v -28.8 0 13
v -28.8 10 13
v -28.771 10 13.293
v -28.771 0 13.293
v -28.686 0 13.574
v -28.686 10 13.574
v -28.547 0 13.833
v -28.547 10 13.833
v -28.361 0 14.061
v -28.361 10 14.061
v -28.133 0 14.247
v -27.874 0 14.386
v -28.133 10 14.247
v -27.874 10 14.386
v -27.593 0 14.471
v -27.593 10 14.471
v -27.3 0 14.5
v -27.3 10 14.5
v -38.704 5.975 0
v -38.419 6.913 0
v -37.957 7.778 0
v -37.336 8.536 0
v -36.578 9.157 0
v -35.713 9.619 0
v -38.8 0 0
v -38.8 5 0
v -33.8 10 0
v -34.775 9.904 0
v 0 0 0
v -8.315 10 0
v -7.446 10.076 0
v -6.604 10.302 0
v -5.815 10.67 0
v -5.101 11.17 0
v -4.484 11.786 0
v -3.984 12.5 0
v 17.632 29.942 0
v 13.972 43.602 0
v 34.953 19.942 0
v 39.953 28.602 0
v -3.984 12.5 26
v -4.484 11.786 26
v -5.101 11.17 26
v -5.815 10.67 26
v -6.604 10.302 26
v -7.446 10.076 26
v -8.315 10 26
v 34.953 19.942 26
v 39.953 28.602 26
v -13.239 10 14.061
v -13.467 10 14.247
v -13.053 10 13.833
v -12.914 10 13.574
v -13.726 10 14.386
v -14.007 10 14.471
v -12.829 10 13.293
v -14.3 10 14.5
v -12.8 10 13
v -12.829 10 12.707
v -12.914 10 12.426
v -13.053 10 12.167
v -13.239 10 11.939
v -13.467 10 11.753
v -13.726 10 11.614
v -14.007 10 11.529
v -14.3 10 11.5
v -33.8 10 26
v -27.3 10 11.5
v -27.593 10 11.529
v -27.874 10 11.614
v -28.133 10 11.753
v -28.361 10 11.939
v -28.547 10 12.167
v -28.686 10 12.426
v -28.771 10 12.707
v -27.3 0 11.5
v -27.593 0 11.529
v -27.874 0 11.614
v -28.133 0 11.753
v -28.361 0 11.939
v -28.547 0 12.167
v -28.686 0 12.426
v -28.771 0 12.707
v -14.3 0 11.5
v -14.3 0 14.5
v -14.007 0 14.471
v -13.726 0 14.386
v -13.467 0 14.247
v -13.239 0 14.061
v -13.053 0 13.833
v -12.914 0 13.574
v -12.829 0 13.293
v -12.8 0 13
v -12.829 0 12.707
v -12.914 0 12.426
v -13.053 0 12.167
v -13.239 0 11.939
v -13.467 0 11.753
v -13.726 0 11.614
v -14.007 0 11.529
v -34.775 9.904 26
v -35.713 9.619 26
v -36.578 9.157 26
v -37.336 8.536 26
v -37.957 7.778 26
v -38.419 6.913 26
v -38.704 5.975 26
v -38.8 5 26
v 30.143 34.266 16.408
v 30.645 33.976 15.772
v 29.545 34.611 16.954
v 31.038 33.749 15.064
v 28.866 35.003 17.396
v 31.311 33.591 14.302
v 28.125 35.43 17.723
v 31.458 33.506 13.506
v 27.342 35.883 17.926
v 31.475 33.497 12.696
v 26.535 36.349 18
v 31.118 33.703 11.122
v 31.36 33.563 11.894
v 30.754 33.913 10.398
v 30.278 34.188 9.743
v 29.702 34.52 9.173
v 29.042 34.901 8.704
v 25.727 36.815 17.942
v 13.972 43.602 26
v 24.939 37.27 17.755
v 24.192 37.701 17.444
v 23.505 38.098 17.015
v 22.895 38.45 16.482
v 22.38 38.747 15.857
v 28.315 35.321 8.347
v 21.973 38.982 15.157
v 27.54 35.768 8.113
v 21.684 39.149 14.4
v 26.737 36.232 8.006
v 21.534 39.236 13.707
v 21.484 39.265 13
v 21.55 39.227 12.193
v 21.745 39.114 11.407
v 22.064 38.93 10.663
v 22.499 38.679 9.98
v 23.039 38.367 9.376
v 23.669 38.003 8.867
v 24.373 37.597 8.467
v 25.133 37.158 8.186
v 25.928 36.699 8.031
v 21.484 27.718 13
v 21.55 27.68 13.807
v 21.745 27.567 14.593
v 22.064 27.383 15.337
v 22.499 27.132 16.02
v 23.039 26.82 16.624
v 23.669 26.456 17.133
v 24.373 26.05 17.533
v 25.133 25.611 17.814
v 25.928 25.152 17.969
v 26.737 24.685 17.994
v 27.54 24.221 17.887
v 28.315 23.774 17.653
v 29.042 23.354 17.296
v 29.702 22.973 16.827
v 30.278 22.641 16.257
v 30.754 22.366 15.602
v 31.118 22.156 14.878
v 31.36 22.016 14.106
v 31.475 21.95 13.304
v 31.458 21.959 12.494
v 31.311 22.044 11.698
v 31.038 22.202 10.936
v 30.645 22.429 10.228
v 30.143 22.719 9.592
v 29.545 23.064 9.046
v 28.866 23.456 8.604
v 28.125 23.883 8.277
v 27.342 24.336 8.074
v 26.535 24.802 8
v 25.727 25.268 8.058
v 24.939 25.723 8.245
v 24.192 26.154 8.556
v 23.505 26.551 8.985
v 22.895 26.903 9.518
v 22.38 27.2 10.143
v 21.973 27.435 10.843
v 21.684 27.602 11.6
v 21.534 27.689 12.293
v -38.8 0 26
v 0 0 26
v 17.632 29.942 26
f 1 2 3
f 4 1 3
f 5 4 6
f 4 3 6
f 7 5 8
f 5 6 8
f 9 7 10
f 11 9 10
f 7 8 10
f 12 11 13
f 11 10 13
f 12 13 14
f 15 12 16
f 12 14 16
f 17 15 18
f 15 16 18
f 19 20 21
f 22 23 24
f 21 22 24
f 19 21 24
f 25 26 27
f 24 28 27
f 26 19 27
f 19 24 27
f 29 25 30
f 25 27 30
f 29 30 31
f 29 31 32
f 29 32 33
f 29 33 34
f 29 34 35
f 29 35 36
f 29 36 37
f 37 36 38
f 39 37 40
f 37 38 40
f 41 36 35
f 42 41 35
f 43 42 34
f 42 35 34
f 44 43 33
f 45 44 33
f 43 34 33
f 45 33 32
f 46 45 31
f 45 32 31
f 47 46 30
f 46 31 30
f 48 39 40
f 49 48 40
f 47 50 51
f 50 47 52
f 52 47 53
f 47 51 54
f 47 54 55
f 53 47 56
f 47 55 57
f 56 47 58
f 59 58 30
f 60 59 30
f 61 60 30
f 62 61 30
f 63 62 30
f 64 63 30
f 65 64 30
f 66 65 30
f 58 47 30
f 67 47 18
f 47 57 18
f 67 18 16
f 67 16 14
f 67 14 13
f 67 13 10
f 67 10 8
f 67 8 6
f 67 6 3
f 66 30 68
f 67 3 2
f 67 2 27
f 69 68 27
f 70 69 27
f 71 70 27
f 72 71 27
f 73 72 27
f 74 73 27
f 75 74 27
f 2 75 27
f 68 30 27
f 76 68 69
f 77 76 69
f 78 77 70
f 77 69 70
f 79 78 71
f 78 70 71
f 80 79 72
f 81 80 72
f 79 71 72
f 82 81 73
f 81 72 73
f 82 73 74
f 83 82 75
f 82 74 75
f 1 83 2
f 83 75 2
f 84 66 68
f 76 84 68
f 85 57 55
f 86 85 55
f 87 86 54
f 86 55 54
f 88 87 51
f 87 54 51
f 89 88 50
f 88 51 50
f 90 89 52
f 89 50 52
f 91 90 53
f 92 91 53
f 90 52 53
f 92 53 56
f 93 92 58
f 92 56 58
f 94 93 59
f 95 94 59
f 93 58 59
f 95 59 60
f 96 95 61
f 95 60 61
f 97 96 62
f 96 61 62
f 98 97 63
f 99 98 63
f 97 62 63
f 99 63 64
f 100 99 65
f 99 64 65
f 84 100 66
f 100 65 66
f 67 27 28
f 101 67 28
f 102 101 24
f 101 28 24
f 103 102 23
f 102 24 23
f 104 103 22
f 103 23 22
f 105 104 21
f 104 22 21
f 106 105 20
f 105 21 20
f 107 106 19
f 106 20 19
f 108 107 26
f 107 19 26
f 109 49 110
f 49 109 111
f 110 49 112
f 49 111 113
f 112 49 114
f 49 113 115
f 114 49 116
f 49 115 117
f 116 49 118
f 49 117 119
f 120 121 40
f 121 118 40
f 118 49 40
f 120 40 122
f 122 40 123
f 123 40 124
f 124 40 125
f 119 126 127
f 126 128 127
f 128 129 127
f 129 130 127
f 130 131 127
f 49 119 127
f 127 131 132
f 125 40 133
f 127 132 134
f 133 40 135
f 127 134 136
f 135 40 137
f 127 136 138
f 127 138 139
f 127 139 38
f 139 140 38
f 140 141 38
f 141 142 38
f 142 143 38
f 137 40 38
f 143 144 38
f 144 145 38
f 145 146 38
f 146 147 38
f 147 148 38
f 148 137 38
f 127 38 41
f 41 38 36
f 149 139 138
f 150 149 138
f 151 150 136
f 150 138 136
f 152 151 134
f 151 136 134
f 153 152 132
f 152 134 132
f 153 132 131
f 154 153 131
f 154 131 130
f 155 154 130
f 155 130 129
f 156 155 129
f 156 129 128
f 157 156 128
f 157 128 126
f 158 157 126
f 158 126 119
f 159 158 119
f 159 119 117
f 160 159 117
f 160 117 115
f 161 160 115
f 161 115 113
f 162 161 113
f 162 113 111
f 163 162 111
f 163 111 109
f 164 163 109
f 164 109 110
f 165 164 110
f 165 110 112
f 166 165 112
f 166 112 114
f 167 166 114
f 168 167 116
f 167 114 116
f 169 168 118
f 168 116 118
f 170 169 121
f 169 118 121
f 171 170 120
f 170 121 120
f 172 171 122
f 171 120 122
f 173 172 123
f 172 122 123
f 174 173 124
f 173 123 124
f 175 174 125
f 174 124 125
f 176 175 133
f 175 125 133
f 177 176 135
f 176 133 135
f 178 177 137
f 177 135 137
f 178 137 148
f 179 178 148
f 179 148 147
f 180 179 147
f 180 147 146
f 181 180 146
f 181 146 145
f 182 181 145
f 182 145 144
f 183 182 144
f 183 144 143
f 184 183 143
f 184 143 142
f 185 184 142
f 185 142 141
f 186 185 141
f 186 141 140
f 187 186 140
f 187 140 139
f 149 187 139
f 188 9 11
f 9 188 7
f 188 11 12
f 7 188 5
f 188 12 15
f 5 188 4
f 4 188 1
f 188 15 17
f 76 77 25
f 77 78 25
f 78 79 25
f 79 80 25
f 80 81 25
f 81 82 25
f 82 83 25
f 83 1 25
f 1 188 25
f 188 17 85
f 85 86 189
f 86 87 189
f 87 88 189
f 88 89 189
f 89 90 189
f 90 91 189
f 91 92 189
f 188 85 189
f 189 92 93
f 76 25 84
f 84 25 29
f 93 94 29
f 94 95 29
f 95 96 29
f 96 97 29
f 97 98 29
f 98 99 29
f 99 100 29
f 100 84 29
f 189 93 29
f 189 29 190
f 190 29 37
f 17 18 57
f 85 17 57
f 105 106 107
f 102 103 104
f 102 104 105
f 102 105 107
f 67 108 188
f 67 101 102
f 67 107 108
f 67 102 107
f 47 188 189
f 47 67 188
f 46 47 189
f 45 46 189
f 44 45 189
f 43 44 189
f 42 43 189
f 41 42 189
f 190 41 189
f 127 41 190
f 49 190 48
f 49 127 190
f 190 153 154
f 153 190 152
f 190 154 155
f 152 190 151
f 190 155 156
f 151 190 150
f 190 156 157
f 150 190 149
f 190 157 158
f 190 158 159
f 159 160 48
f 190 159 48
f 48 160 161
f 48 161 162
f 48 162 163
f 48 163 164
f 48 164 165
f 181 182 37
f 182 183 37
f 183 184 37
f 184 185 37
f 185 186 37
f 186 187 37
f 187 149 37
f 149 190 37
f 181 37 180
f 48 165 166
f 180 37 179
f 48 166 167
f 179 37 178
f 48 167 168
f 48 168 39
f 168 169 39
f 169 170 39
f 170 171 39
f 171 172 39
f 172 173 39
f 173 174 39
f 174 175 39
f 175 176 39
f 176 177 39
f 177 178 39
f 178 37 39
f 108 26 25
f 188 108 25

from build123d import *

# Parameters (mm, degrees)
F1_DEPTH = 26
F3_DEPTH = 25
F5_D     = 10


with BuildPart() as f1:
    # F0 (on Top) → F1 (new body)
    with BuildSketch(Plane.XY):
        with BuildLine():
            Line((-38.8, 5), (-38.8, 0))
            Line((-38.8, 0), (0, 0))
            Line((0, 0), (17.632412, 29.941532))
            Line((17.632412, 29.941532), (34.95292, 19.941532))
            Line((34.95292, 19.941532), (39.95292, 28.601786))
            Line((39.95292, 28.601786), (13.972158, 43.601786))
            Line((13.972158, 43.601786), (-3.984466, 12.5))
            ThreePointArc((-3.984466, 12.5), (-5.814593, 10.669873), (-8.314593, 10))
            Line((-8.314593, 10), (-33.8, 10))
            ThreePointArc((-33.8, 10), (-37.335534, 8.535534), (-38.8, 5))
        make_face()
    extrude(amount=F1_DEPTH)

    # F2 (on face) → F3 (cut)
    with BuildSketch(Plane(origin=(0, 10, 0), x_dir=(-1, 0, 0), z_dir=(0, 1, 0))):
        with BuildLine():
            ThreePointArc((27.3, 11.5), (28.36066, 11.93934), (28.8, 13))
            ThreePointArc((28.8, 13), (28.36066, 14.06066), (27.3, 14.5))
            ThreePointArc((27.3, 14.5), (25.8, 13), (27.3, 11.5))
        make_face()
        with BuildLine():
            ThreePointArc((15.8, 13), (15.36066, 14.06066), (14.3, 14.5))
            ThreePointArc((14.3, 14.5), (12.8, 13), (14.3, 11.5))
            ThreePointArc((14.3, 11.5), (15.36066, 11.93934), (15.8, 13))
        make_face()
        with BuildLine():
            ThreePointArc((27.3, 11.5), (25.8, 13), (27.3, 14.5))
            Line((27.3, 14.5), (14.3, 14.5))
            ThreePointArc((14.3, 14.5), (15.36066, 14.06066), (15.8, 13))
            ThreePointArc((15.8, 13), (15.36066, 11.93934), (14.3, 11.5))
            Line((14.3, 11.5), (27.3, 11.5))
        make_face()
    extrude(amount=-F3_DEPTH, mode=Mode.SUBTRACT)

    # F5 (through all)
    with Locations(Plane.XZ):
        with Locations((26.483979, 13)):
            Hole(F5_D / 2)


solid = f1.part
